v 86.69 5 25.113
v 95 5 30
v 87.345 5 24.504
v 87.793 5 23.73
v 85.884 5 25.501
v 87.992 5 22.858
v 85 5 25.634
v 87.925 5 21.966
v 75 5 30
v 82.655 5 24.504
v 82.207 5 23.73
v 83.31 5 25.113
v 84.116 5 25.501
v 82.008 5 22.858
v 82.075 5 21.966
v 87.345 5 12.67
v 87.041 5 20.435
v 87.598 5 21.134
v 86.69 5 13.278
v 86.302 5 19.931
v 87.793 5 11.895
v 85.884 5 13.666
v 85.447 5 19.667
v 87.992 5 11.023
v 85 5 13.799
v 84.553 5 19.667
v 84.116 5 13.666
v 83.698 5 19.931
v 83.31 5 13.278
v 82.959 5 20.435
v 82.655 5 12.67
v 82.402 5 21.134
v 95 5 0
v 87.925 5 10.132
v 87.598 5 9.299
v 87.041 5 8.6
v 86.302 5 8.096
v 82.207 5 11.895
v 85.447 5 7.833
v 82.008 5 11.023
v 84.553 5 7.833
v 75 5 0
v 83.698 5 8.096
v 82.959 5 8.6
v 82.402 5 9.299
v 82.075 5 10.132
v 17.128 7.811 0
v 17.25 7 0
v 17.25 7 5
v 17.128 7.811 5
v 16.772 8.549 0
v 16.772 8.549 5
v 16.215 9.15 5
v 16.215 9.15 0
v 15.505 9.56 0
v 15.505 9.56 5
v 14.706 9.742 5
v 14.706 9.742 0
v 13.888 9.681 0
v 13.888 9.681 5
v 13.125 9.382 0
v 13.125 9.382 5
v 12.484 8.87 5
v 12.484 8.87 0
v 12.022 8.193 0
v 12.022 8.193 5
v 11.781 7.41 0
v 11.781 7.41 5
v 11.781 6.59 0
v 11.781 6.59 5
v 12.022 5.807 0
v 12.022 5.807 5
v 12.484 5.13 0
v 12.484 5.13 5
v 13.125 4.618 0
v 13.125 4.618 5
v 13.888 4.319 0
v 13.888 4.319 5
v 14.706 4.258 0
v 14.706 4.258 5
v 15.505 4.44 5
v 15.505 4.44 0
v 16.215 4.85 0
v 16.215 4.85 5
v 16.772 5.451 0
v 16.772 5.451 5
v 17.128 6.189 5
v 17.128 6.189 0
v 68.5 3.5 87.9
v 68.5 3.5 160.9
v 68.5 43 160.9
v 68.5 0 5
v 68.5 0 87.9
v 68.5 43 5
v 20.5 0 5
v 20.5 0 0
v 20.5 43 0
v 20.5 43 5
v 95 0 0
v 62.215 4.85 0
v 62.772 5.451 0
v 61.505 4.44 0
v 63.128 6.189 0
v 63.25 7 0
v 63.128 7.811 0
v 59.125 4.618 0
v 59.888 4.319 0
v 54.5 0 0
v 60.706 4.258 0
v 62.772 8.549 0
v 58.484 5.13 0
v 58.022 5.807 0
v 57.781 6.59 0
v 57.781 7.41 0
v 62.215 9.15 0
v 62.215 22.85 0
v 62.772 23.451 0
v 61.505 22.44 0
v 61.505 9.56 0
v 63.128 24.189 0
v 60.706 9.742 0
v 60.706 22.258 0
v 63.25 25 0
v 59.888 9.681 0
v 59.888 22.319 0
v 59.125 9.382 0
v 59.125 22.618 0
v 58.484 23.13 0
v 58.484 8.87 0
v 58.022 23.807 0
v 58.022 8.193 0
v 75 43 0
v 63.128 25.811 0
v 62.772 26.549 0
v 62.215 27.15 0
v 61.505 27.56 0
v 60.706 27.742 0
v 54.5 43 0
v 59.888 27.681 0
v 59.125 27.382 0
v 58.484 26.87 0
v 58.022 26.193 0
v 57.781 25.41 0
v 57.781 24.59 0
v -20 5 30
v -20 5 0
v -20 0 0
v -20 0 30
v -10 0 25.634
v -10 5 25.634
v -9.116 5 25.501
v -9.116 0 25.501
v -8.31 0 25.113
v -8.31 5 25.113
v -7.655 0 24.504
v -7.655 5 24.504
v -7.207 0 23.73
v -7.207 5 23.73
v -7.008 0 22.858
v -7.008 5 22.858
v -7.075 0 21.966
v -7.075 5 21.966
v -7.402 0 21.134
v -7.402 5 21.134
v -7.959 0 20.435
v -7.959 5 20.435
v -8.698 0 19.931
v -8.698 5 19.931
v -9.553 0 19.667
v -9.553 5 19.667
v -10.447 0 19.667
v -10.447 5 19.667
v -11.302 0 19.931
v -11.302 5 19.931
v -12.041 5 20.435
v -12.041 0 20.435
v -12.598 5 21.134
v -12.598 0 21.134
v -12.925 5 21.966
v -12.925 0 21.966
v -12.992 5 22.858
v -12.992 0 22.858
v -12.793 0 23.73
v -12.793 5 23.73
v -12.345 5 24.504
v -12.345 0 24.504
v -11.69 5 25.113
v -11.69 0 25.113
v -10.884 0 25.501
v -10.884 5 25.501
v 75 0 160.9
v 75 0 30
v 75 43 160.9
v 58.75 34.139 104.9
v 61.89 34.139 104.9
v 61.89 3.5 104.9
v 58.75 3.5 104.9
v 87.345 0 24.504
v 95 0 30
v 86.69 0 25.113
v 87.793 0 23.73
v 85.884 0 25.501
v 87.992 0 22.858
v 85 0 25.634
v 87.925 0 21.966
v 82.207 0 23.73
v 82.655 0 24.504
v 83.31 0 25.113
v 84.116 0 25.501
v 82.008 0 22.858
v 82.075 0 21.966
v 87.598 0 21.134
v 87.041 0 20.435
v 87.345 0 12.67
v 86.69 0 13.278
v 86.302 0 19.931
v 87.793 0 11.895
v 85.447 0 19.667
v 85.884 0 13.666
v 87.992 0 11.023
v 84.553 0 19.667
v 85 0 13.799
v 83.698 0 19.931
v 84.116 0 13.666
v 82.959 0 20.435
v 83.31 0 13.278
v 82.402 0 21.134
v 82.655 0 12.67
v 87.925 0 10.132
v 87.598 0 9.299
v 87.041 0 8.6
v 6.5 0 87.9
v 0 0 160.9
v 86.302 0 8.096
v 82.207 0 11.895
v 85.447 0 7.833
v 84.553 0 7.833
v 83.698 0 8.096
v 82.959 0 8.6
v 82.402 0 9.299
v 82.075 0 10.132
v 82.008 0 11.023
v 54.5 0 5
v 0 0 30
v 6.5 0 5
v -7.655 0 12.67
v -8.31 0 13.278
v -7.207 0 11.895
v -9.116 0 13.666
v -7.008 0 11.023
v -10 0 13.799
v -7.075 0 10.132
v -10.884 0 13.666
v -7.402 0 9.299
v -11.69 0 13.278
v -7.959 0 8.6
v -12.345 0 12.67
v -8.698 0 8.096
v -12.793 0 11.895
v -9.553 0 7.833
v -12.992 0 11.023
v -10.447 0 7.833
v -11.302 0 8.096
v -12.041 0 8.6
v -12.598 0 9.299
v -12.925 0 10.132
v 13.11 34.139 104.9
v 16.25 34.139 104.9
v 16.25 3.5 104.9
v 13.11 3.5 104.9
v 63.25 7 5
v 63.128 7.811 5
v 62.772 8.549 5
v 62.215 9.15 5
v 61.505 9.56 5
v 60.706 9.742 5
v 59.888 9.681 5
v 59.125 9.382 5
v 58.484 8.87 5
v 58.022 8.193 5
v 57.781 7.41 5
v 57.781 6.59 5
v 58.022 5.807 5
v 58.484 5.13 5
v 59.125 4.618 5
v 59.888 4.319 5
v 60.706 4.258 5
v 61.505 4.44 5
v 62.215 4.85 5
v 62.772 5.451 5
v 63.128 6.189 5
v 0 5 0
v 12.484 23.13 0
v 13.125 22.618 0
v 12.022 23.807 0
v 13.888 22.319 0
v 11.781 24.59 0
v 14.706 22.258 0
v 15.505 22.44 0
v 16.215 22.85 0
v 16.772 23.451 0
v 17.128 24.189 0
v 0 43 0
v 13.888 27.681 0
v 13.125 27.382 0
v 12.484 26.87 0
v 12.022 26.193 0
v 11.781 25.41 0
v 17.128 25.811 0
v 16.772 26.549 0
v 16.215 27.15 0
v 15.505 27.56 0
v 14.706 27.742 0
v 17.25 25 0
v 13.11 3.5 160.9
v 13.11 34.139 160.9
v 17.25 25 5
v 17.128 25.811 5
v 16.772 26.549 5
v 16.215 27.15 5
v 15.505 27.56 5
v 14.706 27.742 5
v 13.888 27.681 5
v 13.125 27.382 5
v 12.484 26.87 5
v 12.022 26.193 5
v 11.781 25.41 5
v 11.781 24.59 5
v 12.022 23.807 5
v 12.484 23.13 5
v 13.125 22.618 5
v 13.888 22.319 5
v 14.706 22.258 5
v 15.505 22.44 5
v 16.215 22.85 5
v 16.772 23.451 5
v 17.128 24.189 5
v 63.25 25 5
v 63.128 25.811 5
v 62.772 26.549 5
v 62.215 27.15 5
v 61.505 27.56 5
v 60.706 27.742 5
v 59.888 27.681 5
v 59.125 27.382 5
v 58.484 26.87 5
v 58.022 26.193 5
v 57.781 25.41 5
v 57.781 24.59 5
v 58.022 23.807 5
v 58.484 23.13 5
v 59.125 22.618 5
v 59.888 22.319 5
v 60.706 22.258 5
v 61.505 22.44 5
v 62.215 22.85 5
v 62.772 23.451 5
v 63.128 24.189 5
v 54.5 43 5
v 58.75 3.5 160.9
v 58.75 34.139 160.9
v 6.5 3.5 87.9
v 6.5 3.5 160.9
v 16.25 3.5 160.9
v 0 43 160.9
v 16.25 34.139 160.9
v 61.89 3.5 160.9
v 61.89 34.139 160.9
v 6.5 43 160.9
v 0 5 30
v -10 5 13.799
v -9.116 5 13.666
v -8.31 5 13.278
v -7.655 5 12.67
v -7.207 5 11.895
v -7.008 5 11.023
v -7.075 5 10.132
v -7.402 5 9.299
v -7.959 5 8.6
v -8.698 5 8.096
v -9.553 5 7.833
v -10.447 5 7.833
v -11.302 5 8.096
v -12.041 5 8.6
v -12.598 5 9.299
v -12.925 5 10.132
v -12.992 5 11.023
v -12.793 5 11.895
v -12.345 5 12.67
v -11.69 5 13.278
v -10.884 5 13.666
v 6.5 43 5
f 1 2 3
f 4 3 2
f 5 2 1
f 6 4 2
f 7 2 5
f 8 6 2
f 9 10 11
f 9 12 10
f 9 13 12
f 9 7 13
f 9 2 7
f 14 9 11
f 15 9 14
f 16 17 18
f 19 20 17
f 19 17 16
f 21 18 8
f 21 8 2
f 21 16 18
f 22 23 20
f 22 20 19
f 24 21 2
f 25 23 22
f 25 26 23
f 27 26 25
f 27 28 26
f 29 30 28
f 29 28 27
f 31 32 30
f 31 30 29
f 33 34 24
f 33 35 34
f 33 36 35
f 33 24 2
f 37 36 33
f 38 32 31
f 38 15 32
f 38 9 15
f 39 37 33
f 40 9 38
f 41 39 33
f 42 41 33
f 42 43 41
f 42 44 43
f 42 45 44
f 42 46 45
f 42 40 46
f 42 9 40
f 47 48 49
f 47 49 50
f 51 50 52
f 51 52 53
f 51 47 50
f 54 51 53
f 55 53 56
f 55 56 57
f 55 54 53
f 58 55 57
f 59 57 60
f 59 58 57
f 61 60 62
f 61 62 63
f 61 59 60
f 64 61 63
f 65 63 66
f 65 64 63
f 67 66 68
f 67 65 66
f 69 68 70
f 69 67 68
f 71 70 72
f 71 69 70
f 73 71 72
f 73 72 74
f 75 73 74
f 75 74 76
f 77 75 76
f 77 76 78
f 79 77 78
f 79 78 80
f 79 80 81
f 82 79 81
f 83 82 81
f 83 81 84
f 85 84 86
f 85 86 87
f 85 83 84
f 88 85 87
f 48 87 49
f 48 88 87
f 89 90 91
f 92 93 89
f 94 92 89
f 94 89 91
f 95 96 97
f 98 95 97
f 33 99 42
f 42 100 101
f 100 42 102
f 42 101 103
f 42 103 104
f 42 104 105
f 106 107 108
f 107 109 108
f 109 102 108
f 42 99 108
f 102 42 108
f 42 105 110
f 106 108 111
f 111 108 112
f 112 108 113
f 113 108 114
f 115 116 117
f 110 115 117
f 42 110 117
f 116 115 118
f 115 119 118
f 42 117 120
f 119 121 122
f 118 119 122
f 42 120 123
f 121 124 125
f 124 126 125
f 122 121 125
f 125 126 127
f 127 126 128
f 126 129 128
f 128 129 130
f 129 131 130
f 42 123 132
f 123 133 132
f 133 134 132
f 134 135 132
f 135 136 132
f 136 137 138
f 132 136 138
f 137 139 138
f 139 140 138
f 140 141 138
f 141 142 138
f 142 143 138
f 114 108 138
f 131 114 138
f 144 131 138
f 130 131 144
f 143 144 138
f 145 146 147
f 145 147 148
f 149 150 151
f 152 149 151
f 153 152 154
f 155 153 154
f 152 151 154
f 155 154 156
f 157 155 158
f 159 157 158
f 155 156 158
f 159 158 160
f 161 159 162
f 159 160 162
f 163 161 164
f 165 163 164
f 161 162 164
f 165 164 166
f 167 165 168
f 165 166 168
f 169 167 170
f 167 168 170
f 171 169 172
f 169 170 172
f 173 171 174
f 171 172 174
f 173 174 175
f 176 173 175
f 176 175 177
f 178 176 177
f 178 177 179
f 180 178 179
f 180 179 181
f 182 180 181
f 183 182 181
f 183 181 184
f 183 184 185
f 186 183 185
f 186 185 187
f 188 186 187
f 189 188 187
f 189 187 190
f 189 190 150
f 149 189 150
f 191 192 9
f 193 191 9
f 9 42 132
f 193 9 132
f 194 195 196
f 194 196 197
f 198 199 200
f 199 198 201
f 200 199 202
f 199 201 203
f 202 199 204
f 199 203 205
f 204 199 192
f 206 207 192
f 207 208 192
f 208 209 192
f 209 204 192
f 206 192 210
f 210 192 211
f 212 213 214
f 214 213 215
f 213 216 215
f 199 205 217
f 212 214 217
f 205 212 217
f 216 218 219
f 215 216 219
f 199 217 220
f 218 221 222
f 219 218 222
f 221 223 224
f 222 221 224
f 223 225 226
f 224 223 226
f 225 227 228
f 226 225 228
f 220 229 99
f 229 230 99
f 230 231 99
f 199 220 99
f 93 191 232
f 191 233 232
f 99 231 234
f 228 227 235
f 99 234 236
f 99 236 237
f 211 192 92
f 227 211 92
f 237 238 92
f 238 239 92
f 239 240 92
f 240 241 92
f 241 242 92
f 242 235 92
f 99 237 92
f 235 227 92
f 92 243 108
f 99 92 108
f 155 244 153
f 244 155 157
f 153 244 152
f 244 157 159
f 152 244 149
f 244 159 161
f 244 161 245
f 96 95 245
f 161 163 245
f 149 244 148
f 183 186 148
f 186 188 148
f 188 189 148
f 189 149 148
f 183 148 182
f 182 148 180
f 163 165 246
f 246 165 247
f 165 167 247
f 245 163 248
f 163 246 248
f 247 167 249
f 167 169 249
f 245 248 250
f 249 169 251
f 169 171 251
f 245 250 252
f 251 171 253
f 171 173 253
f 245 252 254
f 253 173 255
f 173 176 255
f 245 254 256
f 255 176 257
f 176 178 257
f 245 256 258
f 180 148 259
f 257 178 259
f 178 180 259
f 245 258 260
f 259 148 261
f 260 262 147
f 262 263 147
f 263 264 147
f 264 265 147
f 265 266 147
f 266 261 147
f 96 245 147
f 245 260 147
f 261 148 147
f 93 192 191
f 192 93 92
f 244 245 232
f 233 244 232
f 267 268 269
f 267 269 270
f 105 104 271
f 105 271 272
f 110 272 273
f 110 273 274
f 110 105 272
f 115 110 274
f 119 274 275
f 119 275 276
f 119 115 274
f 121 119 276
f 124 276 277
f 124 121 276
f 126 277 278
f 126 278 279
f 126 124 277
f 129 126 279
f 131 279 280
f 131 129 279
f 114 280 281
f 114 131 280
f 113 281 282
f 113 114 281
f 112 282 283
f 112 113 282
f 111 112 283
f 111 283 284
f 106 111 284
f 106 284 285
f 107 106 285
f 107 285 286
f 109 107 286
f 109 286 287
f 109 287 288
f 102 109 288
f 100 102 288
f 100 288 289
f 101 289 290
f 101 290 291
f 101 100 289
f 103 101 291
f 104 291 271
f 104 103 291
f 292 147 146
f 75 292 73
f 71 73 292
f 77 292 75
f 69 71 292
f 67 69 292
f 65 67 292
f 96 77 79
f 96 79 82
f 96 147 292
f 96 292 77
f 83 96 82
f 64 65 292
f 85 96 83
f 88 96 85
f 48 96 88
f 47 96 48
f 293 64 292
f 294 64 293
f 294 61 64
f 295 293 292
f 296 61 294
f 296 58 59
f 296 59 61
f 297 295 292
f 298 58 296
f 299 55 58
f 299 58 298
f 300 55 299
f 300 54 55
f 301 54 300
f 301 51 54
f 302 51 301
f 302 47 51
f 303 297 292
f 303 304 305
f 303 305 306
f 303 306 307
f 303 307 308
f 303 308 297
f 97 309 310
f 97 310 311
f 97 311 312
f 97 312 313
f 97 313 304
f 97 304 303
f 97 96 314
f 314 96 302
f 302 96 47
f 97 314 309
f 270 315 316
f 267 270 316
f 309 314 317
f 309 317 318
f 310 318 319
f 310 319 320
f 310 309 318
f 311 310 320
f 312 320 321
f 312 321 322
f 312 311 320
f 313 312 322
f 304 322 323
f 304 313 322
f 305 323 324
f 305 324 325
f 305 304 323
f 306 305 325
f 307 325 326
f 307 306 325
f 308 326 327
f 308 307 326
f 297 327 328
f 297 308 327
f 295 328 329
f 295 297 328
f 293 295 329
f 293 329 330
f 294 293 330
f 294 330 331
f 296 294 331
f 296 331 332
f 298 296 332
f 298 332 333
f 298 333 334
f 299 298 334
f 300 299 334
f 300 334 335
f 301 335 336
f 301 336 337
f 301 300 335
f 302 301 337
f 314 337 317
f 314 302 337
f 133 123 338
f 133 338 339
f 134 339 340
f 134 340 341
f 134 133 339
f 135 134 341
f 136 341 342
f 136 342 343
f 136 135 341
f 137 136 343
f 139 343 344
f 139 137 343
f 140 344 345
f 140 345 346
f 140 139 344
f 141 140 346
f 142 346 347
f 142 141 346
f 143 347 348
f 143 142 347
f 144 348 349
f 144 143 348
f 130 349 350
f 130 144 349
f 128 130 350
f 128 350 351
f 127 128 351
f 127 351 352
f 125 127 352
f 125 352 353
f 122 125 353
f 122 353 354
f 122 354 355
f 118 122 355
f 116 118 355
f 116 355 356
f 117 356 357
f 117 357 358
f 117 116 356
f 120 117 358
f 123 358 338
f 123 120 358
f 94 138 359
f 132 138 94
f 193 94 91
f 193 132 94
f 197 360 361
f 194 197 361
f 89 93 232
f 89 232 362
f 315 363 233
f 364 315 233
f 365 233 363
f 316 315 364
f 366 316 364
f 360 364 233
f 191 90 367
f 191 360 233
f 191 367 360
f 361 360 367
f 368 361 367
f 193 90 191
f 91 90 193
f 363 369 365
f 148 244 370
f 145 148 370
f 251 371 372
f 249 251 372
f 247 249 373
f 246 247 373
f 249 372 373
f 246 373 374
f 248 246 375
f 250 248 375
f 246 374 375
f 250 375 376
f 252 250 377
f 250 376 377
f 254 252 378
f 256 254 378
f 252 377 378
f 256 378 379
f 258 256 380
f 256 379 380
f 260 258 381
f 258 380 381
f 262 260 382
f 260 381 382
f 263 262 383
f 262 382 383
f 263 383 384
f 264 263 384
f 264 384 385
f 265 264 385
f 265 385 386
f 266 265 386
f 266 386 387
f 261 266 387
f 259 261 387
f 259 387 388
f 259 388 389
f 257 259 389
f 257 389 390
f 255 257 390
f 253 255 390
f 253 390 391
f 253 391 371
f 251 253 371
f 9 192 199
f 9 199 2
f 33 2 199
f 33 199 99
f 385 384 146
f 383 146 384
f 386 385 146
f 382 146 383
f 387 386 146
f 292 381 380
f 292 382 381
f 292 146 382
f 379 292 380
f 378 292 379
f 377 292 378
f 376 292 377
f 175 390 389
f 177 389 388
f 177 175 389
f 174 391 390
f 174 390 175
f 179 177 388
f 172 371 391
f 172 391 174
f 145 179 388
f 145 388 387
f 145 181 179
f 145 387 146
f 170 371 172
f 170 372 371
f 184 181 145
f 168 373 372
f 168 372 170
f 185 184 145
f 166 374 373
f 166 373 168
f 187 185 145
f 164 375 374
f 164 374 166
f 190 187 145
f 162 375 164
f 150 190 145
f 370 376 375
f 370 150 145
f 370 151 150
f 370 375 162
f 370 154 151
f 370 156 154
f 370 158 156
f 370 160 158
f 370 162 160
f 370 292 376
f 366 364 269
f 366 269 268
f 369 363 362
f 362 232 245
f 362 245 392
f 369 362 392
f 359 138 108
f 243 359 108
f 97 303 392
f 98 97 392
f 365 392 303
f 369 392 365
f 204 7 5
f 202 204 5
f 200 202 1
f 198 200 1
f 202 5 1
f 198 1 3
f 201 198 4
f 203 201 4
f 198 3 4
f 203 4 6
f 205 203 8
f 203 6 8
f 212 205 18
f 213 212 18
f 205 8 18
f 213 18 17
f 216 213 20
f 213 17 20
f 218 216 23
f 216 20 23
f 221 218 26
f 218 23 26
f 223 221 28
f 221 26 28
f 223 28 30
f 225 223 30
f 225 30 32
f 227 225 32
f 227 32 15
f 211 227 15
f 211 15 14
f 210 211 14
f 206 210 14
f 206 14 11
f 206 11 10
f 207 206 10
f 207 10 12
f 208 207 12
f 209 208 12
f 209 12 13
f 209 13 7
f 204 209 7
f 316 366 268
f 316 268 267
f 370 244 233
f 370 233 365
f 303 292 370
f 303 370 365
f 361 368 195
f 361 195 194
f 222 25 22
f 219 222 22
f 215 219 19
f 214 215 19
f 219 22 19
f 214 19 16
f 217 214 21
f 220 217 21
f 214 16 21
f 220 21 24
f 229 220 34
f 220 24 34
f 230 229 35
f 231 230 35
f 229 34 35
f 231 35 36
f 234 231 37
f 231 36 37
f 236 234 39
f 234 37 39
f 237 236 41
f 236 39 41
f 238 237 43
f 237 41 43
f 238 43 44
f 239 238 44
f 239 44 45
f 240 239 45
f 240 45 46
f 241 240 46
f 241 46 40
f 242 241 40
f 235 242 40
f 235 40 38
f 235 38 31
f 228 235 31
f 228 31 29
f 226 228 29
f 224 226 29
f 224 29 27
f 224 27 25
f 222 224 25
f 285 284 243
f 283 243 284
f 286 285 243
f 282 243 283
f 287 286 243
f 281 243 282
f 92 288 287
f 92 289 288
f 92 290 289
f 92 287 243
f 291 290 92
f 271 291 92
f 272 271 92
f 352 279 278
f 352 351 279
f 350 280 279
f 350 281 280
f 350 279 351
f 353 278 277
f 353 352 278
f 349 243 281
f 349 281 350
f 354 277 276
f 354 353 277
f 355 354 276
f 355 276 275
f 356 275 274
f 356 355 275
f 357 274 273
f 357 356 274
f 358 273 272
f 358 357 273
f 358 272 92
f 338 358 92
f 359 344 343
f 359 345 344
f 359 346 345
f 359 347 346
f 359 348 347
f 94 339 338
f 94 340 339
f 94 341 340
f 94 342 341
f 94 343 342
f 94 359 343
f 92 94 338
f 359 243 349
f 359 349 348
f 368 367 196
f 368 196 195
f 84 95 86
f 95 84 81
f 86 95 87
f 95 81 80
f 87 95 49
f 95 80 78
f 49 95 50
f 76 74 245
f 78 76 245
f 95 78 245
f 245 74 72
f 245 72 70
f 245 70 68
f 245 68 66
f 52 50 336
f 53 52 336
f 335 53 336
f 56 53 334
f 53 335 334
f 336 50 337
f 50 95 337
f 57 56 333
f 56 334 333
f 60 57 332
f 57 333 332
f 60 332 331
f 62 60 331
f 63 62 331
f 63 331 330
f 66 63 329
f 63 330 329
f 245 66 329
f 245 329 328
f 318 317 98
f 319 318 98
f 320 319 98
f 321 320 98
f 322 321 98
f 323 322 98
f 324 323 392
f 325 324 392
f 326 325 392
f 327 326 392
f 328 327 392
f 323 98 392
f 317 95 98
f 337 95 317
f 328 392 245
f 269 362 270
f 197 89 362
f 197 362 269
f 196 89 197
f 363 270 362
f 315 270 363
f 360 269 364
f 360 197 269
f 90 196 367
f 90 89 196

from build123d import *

# Parameters (mm, degrees)
SKETCH1_R             = 2.75
BOSS_EXTRUDE1_DEPTH   = 5
BOSS_EXTRUDE1_2_DEPTH = 5
SKETCH16_W            = 6.5
SKETCH16_H            = 43
BOSS_EXTRUDE2_DEPTH   = 162.9
SKETCH18_W            = 80
SKETCH18_H            = 3.5
BOSS_EXTRUDE3_DEPTH   = 64.9
SKETCH19_W            = 5
SKETCH19_H            = 39.5
BOSS_EXTRUDE4_DEPTH   = 64.9
SKETCH20_W            = 30
SKETCH20_H            = 5
BOSS_EXTRUDE5_DEPTH   = 20
SKETCH21_W            = 30
SKETCH21_H            = 5
BOSS_EXTRUDE6_DEPTH   = 20
SKETCH22_R            = 3
CUT_EXTRUDE1_DEPTH    = 20
SKETCH24_W            = 3.140120034
SKETCH24_H            = 30.638672015
SKETCH24_W_2          = 3.14
BOSS_EXTRUDE8_DEPTH   = 58
SKETCH25_W            = 75
SKETCH25_H            = 43
CUT_EXTRUDE2_DEPTH    = 7


with BuildPart() as part:
    # Sketch1 → Boss-Extrude1 (new body)
    with BuildSketch(Plane.XY):
        Polygon((20.5, 43), (20.5, 18), (20.5, 0), (0, 0), (0, 43), align=None)
        with Locations((14.5, 25)):
            Circle(SKETCH1_R, mode=Mode.SUBTRACT)
        with Locations((14.5, 7)):
            Circle(SKETCH1_R, mode=Mode.SUBTRACT)
    extrude(amount=BOSS_EXTRUDE1_DEPTH)



with BuildPart() as body_2:
    # Sketch1 → Boss-Extrude1 2 (new body)
    with BuildSketch(Plane.XY):
        Polygon((75, 0), (75, 43), (54.5, 43), (54.5, 18), (54.5, 0), align=None)
        with Locations((60.5, 7)):
            Circle(SKETCH1_R, mode=Mode.SUBTRACT)
        with Locations((60.5, 25)):
            Circle(SKETCH1_R, mode=Mode.SUBTRACT)
    extrude(amount=BOSS_EXTRUDE1_2_DEPTH)


with BuildPart() as part_1:
    add(part.part)

    add(body_2.part)  # Boss-Extrude2 merges body 2
    # Sketch16 → Boss-Extrude2 (add)
    with BuildSketch(Plane.XY.offset(5)):
        with Locations((71.75, 21.5)):
            Rectangle(SKETCH16_W, SKETCH16_H)
        with Locations((3.25, 21.5)):
            Rectangle(SKETCH16_W, SKETCH16_H)
    extrude(amount=BOSS_EXTRUDE2_DEPTH)

    # Sketch18 → Boss-Extrude3 (add)
    with BuildSketch(Plane.ZY.offset(-68.5)):
        with Locations((127.9, 1.75)):
            Rectangle(SKETCH18_W, SKETCH18_H)
    extrude(amount=BOSS_EXTRUDE3_DEPTH)

    # Sketch19 → Boss-Extrude4 (add)
    with BuildSketch(Plane.ZY.offset(-68.5)):
        with Locations((165.4, 23.25)):
            Rectangle(SKETCH19_W, SKETCH19_H)
    extrude(amount=BOSS_EXTRUDE4_DEPTH)

    # Sketch20 → Boss-Extrude5 (add)
    with BuildSketch(Plane.ZY):
        with Locations((15, 2.5)):
            Rectangle(SKETCH20_W, SKETCH20_H)
    extrude(amount=BOSS_EXTRUDE5_DEPTH)

    # Sketch21 → Boss-Extrude6 (add)
    with BuildSketch(Plane(origin=(75, 0, 0), x_dir=(0, 0, -1), z_dir=(1, 0, 0))):
        with Locations((-15, 2.5)):
            Rectangle(SKETCH21_W, SKETCH21_H)
    extrude(amount=BOSS_EXTRUDE6_DEPTH)

    # Sketch22 → Cut-Extrude1 (cut)
    with BuildSketch(Plane(origin=(0, 5, 0), x_dir=(1, 0, 0), z_dir=(0, 1, 0))):
        with Locations(Location((-10, -10.799084074, 0), (0, 0, 270))):
            Circle(SKETCH22_R)
        with Locations(Location((-10, -22.633830435, 0), (0, 0, 270))):
            Circle(SKETCH22_R)
        with Locations(Location((85, -10.799084074, 0), (0, 0, 270))):
            Circle(SKETCH22_R)
        with Locations(Location((85, -22.633830435, 0), (0, 0, 270))):
            Circle(SKETCH22_R)
    extrude(amount=-CUT_EXTRUDE1_DEPTH, mode=Mode.SUBTRACT)

    # Sketch24 → Boss-Extrude8 (add)
    with BuildSketch(Plane(origin=(0, 0, 162.9), x_dir=(-1, 0, 0), z_dir=(0, 0, -1))):
        with Locations((-60.320060017, 18.819336008)):
            Rectangle(SKETCH24_W, SKETCH24_H)
        with Locations((-14.68, 18.819336008)):
            Rectangle(SKETCH24_W_2, SKETCH24_H)
    extrude(amount=BOSS_EXTRUDE8_DEPTH)

    # Sketch25 → Cut-Extrude2 (cut)
    with BuildSketch(Plane.XY.offset(167.9)):
        with Locations((37.5, 21.5)):
            Rectangle(SKETCH25_W, SKETCH25_H)
    extrude(amount=-CUT_EXTRUDE2_DEPTH, mode=Mode.SUBTRACT)


solid = part_1.part
